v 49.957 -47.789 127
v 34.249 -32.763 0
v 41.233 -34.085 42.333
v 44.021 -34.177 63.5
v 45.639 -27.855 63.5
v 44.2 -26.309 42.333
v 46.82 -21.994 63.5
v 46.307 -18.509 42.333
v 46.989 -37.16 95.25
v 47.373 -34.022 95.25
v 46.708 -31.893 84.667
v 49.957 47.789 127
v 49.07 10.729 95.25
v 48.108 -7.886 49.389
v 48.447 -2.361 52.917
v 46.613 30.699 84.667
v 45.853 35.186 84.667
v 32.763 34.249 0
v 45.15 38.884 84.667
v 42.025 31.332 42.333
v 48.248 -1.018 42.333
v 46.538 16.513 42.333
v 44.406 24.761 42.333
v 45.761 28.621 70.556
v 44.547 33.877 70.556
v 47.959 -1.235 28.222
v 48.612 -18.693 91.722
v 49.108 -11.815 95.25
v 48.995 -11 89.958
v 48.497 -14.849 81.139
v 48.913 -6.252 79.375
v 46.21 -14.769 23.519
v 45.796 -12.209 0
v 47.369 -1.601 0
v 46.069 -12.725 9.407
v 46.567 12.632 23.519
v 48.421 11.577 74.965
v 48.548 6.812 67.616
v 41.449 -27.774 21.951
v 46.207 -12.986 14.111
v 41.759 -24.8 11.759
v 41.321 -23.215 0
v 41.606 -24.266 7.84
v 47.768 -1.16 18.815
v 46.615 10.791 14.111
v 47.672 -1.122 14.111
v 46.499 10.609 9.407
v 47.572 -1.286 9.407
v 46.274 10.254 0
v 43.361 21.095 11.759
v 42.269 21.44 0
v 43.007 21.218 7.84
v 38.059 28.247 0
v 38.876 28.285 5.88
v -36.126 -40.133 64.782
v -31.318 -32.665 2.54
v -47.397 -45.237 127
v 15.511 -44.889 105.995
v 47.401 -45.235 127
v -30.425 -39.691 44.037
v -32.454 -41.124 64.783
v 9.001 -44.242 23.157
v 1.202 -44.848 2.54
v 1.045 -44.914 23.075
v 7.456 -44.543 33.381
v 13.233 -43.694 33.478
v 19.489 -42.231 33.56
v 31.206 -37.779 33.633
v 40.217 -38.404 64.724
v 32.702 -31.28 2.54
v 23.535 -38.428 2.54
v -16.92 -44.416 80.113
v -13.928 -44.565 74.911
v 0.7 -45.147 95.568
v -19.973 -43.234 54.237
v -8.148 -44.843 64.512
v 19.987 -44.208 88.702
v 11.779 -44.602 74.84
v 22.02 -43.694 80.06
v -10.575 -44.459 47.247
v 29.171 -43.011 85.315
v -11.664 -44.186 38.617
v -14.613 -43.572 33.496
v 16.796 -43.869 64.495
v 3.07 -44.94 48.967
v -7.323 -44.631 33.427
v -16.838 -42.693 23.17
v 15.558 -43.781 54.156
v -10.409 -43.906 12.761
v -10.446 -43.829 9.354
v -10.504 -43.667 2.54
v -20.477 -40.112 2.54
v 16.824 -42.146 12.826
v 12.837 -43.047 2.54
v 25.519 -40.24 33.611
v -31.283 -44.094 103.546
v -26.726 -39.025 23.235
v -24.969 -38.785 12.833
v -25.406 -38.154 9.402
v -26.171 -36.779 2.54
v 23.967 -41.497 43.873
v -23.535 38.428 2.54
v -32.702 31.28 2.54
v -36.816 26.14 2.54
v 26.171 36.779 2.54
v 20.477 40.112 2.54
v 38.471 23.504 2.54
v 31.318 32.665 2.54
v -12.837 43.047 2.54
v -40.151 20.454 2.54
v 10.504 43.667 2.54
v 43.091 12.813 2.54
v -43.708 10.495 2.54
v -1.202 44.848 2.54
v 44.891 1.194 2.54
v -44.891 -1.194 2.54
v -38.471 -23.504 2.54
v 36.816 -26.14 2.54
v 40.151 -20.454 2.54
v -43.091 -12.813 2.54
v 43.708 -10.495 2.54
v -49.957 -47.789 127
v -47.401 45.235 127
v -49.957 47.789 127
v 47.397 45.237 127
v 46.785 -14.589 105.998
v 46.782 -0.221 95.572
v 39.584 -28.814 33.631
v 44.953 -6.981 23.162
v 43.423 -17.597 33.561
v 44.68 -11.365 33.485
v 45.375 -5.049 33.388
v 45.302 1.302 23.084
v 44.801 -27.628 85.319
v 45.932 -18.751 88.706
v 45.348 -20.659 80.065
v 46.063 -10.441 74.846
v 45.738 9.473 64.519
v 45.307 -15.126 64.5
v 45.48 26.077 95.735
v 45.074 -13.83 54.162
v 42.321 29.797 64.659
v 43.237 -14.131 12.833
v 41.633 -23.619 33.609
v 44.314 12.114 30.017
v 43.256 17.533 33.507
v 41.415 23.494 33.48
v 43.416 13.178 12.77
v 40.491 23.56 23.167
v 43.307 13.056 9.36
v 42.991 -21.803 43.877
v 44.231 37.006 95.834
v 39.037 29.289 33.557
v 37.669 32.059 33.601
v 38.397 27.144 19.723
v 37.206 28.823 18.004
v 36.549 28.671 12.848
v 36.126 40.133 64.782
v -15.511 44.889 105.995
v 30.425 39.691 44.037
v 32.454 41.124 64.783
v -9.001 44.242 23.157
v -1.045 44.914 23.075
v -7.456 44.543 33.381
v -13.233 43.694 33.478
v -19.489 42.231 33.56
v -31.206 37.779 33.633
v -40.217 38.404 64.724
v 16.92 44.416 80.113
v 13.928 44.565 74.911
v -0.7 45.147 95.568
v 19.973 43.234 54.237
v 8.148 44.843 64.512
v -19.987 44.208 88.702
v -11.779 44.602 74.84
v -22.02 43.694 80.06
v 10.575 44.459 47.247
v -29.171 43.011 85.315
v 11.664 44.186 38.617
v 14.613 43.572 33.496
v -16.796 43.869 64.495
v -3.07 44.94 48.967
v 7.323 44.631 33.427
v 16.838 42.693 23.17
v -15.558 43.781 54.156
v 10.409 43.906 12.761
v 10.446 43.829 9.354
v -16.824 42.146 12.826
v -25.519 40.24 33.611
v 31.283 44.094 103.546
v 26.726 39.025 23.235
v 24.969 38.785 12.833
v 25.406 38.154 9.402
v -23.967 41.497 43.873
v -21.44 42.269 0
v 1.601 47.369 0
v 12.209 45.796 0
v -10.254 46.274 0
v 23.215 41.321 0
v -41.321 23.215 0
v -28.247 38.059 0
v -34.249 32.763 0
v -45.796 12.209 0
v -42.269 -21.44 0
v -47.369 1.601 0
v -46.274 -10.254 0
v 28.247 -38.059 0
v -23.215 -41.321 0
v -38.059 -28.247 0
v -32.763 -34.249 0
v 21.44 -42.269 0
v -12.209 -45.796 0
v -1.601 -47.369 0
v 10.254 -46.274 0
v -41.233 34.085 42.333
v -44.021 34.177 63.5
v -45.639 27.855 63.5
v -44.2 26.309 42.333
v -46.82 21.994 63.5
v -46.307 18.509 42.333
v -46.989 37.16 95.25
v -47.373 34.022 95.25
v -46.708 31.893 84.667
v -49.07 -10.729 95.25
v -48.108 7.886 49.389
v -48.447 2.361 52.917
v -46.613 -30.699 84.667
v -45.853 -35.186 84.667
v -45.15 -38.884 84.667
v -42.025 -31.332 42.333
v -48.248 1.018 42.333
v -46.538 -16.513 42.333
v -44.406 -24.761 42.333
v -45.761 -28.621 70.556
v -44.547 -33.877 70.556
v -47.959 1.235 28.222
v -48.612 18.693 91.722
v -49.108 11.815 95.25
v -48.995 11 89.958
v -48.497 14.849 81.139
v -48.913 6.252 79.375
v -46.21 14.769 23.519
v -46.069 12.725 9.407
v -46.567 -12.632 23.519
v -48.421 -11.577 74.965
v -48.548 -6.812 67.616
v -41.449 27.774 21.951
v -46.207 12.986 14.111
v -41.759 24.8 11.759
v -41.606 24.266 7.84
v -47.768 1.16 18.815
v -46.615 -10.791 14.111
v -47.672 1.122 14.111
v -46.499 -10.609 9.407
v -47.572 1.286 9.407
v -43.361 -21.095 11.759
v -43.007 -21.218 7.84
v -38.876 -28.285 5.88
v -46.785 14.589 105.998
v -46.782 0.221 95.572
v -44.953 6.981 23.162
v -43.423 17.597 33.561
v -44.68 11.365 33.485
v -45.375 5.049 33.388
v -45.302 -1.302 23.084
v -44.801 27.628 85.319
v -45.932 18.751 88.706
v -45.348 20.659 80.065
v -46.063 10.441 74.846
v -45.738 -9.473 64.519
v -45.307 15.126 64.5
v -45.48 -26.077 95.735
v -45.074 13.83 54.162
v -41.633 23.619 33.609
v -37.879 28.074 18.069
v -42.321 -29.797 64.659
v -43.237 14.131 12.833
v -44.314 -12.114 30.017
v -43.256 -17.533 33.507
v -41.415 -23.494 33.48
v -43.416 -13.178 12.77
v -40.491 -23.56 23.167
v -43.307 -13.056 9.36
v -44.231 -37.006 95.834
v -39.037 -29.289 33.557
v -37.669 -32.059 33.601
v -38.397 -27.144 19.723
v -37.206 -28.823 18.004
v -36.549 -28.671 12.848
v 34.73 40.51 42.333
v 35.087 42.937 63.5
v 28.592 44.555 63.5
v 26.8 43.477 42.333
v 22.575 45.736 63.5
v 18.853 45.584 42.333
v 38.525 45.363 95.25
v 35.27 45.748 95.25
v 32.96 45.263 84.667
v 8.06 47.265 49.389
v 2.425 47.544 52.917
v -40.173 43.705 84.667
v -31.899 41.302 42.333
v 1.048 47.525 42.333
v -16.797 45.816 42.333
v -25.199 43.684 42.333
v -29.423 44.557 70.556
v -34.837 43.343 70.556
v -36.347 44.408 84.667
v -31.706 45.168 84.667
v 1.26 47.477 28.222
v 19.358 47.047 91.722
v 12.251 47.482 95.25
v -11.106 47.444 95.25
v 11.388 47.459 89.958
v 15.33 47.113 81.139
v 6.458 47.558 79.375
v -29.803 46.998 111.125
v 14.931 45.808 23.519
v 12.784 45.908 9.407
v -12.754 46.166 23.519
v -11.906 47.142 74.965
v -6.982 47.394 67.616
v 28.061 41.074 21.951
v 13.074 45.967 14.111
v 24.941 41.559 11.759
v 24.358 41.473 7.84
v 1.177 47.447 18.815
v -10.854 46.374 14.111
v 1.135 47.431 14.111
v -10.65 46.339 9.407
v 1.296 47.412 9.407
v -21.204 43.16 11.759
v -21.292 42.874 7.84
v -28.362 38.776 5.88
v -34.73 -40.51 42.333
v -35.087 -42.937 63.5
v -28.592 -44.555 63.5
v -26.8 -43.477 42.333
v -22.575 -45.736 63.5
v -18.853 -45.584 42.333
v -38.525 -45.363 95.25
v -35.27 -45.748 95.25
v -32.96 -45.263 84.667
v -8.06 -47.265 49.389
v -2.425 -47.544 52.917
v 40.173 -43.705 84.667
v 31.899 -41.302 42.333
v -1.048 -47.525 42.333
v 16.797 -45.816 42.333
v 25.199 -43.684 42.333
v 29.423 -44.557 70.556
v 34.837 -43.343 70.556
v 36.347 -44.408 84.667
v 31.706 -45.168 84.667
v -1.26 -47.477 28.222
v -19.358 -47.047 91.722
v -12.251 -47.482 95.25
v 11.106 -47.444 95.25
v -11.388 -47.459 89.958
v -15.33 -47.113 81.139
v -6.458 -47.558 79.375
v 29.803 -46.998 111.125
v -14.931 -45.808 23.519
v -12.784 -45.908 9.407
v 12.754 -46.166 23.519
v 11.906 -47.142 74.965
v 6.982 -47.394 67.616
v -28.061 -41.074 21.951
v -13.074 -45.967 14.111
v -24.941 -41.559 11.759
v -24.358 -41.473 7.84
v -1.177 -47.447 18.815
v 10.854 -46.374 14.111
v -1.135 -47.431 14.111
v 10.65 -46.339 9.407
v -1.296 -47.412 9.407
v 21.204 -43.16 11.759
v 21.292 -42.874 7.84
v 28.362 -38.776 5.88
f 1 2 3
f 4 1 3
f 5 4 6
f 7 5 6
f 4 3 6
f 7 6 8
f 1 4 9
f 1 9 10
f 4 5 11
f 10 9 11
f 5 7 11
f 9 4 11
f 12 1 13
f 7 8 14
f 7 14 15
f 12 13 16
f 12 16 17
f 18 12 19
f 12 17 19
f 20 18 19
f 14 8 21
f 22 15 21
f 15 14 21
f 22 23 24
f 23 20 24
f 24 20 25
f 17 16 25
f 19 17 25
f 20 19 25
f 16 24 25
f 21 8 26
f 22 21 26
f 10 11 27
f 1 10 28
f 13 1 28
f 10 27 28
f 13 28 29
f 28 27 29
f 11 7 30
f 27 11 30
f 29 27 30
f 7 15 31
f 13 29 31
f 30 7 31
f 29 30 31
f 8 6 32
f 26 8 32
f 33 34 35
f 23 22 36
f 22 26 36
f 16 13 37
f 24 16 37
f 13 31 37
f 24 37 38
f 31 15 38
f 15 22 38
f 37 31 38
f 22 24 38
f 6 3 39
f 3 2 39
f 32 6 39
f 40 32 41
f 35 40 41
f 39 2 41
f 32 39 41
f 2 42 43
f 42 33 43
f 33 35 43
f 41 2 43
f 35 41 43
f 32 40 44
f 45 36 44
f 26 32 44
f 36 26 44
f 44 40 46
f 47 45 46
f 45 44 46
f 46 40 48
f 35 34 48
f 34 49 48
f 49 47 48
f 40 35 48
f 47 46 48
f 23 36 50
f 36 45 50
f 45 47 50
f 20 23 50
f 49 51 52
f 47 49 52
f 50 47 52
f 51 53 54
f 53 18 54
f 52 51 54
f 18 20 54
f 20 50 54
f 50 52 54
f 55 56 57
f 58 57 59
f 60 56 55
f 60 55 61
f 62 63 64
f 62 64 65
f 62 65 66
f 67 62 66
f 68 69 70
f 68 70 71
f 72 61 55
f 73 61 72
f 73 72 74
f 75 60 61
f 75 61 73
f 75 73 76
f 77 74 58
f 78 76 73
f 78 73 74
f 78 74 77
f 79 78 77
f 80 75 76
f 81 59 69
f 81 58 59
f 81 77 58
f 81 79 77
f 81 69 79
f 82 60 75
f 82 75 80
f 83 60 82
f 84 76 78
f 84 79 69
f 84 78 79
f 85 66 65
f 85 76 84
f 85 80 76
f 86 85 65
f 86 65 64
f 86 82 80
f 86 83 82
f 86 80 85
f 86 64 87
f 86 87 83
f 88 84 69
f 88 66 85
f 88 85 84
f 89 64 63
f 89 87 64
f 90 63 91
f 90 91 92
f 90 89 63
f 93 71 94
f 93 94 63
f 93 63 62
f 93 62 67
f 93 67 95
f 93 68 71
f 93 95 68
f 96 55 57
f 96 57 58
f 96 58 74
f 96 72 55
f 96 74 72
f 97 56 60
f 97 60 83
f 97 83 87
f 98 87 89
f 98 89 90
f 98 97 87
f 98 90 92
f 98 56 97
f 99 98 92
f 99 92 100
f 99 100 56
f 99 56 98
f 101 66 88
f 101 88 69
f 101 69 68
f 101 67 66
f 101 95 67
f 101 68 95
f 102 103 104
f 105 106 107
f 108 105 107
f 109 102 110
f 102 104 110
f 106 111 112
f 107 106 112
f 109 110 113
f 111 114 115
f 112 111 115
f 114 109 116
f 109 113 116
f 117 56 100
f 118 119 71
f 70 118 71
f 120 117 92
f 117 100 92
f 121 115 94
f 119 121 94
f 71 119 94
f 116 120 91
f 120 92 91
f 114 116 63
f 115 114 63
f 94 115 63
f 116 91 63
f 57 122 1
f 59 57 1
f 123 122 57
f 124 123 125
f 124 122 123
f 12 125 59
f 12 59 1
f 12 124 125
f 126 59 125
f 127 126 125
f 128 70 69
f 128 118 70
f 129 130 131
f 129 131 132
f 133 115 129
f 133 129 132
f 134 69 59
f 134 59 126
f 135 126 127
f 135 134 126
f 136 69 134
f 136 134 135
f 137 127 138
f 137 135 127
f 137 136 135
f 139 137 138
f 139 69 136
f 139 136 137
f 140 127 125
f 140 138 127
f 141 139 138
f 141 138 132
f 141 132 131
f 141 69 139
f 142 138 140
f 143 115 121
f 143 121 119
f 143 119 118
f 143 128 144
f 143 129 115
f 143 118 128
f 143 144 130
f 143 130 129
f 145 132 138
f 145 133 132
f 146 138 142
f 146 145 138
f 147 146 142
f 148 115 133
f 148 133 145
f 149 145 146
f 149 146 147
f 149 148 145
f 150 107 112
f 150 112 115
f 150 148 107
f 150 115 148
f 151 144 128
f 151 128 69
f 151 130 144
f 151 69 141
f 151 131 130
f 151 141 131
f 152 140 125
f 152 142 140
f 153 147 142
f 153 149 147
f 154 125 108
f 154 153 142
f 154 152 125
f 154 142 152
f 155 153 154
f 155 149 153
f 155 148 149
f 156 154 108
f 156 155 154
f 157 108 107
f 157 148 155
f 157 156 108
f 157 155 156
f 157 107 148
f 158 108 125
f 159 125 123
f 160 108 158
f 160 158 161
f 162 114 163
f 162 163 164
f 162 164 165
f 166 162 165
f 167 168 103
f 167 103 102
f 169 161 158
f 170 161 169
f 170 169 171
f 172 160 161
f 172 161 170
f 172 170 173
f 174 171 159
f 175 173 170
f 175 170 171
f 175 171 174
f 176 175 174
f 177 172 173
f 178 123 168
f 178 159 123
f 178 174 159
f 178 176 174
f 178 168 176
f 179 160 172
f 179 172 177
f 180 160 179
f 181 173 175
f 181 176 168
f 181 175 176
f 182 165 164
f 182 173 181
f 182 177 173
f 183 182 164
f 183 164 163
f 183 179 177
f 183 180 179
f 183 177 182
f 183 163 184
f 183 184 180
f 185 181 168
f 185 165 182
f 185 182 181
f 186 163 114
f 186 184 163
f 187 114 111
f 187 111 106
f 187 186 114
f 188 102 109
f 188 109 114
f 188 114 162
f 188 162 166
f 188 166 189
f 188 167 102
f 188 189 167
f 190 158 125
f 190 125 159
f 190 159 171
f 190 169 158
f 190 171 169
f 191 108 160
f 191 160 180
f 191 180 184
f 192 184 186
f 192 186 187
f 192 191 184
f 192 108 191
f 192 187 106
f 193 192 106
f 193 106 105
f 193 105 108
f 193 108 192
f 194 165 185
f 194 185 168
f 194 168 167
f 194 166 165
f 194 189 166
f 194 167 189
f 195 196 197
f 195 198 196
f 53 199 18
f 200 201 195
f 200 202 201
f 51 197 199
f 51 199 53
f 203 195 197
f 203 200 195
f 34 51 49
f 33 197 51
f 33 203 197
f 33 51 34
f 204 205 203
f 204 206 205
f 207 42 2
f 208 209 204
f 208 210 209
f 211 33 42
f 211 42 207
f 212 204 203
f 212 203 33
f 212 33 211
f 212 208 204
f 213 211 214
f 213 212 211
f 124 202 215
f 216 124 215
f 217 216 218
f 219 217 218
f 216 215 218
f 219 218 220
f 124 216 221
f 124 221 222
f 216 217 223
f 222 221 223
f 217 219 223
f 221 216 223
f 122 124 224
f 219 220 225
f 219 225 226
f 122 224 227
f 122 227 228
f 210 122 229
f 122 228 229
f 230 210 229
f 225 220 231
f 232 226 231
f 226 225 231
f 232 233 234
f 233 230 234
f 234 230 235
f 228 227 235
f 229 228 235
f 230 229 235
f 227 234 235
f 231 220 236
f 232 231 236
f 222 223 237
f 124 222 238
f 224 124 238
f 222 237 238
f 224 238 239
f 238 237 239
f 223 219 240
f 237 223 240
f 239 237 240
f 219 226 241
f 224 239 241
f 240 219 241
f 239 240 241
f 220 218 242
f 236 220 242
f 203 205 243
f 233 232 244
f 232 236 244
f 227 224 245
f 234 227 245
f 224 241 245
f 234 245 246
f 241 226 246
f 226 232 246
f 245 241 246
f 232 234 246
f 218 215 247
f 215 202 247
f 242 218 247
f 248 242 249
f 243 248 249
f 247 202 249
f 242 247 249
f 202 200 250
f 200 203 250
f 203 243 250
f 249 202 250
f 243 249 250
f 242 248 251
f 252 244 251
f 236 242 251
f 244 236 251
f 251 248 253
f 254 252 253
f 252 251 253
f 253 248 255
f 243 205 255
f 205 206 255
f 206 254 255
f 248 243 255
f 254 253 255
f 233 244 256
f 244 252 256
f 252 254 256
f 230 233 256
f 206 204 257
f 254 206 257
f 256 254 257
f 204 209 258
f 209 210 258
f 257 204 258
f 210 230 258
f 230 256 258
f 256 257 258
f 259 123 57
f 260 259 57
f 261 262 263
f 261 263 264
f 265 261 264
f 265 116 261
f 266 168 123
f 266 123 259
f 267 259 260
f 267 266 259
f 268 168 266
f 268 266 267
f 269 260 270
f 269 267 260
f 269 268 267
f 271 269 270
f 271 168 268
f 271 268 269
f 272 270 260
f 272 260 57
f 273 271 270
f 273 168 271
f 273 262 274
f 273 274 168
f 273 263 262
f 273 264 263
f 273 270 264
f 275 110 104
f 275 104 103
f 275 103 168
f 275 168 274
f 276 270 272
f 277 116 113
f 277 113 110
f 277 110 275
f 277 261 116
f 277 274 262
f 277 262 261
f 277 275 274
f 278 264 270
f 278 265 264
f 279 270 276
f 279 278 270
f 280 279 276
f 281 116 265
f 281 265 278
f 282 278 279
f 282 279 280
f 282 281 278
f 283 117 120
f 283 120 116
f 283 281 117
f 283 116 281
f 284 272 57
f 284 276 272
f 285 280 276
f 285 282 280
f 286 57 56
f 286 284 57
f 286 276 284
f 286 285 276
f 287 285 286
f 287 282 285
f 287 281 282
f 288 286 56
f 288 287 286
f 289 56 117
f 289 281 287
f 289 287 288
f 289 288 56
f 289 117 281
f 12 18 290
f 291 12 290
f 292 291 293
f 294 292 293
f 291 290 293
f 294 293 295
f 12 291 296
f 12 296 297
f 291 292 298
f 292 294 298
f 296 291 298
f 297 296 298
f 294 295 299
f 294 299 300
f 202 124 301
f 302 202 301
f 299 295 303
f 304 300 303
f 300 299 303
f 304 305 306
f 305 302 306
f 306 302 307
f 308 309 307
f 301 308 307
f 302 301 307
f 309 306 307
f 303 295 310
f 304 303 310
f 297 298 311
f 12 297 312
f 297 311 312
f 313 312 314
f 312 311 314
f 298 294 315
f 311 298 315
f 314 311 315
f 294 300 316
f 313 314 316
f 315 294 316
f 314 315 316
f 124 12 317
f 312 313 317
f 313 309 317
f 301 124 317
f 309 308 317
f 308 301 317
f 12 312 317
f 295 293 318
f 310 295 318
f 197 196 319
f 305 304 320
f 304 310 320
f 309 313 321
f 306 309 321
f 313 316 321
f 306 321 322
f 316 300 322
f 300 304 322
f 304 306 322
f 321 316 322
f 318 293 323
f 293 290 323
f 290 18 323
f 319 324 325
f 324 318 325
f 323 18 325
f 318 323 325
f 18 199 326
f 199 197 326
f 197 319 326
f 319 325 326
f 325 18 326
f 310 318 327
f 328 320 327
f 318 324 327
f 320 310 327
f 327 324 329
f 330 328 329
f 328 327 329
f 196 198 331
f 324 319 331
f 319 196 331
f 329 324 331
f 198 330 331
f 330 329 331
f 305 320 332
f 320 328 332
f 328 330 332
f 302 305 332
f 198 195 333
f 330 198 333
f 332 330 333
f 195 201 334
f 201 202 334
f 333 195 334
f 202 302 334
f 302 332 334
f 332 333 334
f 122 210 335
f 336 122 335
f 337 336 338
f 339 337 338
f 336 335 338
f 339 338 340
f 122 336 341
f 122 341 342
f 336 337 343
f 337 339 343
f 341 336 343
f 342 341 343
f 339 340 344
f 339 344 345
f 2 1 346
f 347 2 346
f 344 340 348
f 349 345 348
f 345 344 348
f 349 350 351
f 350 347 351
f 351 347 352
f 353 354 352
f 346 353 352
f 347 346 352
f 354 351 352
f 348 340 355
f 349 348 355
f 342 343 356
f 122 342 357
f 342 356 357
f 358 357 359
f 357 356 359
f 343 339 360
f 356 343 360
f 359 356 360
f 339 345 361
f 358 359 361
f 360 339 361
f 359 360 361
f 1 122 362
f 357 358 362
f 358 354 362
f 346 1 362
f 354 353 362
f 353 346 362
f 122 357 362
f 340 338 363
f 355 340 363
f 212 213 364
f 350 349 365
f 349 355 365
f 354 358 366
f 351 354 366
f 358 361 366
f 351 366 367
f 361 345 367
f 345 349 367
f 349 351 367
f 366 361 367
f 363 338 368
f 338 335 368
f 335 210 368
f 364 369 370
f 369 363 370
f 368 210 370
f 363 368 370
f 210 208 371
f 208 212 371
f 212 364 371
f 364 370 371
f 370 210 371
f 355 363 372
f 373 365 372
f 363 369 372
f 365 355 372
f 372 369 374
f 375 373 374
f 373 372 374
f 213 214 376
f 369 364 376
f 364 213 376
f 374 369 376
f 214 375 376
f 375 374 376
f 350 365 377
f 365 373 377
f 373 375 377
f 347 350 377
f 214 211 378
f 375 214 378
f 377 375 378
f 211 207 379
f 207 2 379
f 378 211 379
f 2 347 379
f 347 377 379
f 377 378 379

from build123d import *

# Parameters (mm, degrees)
F2_W = 99.9139621854
F2_H = 95.5784469843
F4_T = 2.54


# Not quite as in the source:
# - the arcs of a loft's sections are written as splines that run evenly, so that the points pair up as in the source's solid
# - a shell that OpenCascade refuses in one call is made with other operations: the cavity is built on its own and cut out


with BuildPart() as f3:
    # F2 (on offset) → F3 section 0
    with BuildSketch(Plane.XY.offset(127)):
        Rectangle(F2_W, F2_H)
    # F0 (on Top) → F3 section 1
    with BuildSketch(Plane.XY):
        with BuildLine():
            add(Edge.make_bspline(
                [(34.2488721695, -32.7627284648), (36.3931877331, -30.5211450231), (38.3166790346, -28.0684255821), (41.6482828465, -22.8347310657), (43.0563129764, -20.0538854036), (45.3028578067, -14.2707911992), (46.1413169567, -11.2686856553), (47.2164693474, -5.1584328302), (47.4531360028, -2.0504366369), (47.3155784505, 4.1521612197), (46.9413576443, 7.2466095116), (45.5963764086, 13.3031900424), (44.6256492365, 16.2651725205), (42.1249311921, 21.9429847323), (40.5950021549, 24.658674071), (37.0346484938, 29.7395228248), (35.0043119065, 32.1045566058), (32.7627284648, 34.2488721695)],
                knots=[0, 0, 0, 0, 0.125, 0.125, 0.25, 0.25, 0.375, 0.375, 0.5, 0.5, 0.625, 0.625, 0.75, 0.75, 0.875, 0.875, 1, 1, 1, 1], degree=3))
            add(Edge.make_bspline(
                [(32.7627284648, 34.2488721695), (30.5211450231, 36.3931877331), (28.0684255821, 38.3166790346), (22.8347310657, 41.6482828465), (20.0538854036, 43.0563129764), (14.2707911992, 45.3028578067), (11.2686856553, 46.1413169567), (5.1584328302, 47.2164693474), (2.0504366369, 47.4531360028), (-4.1521612197, 47.3155784505), (-7.2466095116, 46.9413576443), (-13.3031900424, 45.5963764086), (-16.2651725205, 44.6256492365), (-21.9429847323, 42.1249311921), (-24.658674071, 40.5950021549), (-29.7395228248, 37.0346484938), (-32.1045566058, 35.0043119065), (-34.2488721695, 32.7627284648)],
                knots=[0, 0, 0, 0, 0.125, 0.125, 0.25, 0.25, 0.375, 0.375, 0.5, 0.5, 0.625, 0.625, 0.75, 0.75, 0.875, 0.875, 1, 1, 1, 1], degree=3))
            add(Edge.make_bspline(
                [(-34.2488721695, 32.7627284648), (-36.3931877331, 30.5211450231), (-38.3166790346, 28.0684255821), (-41.6482828465, 22.8347310657), (-43.0563129764, 20.0538854036), (-45.3028578067, 14.2707911992), (-46.1413169567, 11.2686856553), (-47.2164693474, 5.1584328302), (-47.4531360028, 2.0504366369), (-47.3155784505, -4.1521612197), (-46.9413576443, -7.2466095116), (-45.5963764086, -13.3031900424), (-44.6256492365, -16.2651725205), (-42.1249311921, -21.9429847323), (-40.5950021549, -24.658674071), (-37.0346484938, -29.7395228248), (-35.0043119065, -32.1045566058), (-32.7627284648, -34.2488721695)],
                knots=[0, 0, 0, 0, 0.125, 0.125, 0.25, 0.25, 0.375, 0.375, 0.5, 0.5, 0.625, 0.625, 0.75, 0.75, 0.875, 0.875, 1, 1, 1, 1], degree=3))
            add(Edge.make_bspline(
                [(-32.7627284648, -34.2488721695), (-30.5211450231, -36.3931877331), (-28.0684255821, -38.3166790346), (-22.8347310657, -41.6482828465), (-20.0538854036, -43.0563129764), (-14.2707911992, -45.3028578067), (-11.2686856553, -46.1413169567), (-5.1584328302, -47.2164693474), (-2.0504366369, -47.4531360028), (4.1521612197, -47.3155784505), (7.2466095116, -46.9413576443), (13.3031900424, -45.5963764086), (16.2651725205, -44.6256492365), (21.9429847323, -42.1249311921), (24.658674071, -40.5950021549), (29.7395228248, -37.0346484938), (32.1045566058, -35.0043119065), (34.2488721695, -32.7627284648)],
                knots=[0, 0, 0, 0, 0.125, 0.125, 0.25, 0.25, 0.375, 0.375, 0.5, 0.5, 0.625, 0.625, 0.75, 0.75, 0.875, 0.875, 1, 1, 1, 1], degree=3))
        make_face()
    loft(ruled=True)

    # F4: shell of thickness 2.54, made by hand


with BuildPart() as f4_core1:
    # F4_t2: copy of F3
    add(f3.part)

    # the walls: a layer under each face that stays
    f4_faces = [f4_core1.faces().sort_by_distance(p)[0] for p in [
        (0.5254311457, -47.5867903594, 63.5),
        (48.6706691597, 0.5254311457, 63.5),
        (-0.5254311457, 47.5867903594, 63.5),
        (-48.6706691597, -0.5254311457, 63.5),
        (0, 0, 0),
    ]]
    thicken(f4_faces, amount=-F4_T, mode=Mode.SUBTRACT)


with BuildPart() as f3_1:
    add(f3.part)

    # what is left inside the walls is the cavity
    f4_cavity = [f4_core1.part.solids().sort_by_distance(p)[0] for p in [
        (0.329341, -45.091155, 85.374003),
    ]]
    add(f4_cavity, mode=Mode.SUBTRACT)


solid = f3_1.part
